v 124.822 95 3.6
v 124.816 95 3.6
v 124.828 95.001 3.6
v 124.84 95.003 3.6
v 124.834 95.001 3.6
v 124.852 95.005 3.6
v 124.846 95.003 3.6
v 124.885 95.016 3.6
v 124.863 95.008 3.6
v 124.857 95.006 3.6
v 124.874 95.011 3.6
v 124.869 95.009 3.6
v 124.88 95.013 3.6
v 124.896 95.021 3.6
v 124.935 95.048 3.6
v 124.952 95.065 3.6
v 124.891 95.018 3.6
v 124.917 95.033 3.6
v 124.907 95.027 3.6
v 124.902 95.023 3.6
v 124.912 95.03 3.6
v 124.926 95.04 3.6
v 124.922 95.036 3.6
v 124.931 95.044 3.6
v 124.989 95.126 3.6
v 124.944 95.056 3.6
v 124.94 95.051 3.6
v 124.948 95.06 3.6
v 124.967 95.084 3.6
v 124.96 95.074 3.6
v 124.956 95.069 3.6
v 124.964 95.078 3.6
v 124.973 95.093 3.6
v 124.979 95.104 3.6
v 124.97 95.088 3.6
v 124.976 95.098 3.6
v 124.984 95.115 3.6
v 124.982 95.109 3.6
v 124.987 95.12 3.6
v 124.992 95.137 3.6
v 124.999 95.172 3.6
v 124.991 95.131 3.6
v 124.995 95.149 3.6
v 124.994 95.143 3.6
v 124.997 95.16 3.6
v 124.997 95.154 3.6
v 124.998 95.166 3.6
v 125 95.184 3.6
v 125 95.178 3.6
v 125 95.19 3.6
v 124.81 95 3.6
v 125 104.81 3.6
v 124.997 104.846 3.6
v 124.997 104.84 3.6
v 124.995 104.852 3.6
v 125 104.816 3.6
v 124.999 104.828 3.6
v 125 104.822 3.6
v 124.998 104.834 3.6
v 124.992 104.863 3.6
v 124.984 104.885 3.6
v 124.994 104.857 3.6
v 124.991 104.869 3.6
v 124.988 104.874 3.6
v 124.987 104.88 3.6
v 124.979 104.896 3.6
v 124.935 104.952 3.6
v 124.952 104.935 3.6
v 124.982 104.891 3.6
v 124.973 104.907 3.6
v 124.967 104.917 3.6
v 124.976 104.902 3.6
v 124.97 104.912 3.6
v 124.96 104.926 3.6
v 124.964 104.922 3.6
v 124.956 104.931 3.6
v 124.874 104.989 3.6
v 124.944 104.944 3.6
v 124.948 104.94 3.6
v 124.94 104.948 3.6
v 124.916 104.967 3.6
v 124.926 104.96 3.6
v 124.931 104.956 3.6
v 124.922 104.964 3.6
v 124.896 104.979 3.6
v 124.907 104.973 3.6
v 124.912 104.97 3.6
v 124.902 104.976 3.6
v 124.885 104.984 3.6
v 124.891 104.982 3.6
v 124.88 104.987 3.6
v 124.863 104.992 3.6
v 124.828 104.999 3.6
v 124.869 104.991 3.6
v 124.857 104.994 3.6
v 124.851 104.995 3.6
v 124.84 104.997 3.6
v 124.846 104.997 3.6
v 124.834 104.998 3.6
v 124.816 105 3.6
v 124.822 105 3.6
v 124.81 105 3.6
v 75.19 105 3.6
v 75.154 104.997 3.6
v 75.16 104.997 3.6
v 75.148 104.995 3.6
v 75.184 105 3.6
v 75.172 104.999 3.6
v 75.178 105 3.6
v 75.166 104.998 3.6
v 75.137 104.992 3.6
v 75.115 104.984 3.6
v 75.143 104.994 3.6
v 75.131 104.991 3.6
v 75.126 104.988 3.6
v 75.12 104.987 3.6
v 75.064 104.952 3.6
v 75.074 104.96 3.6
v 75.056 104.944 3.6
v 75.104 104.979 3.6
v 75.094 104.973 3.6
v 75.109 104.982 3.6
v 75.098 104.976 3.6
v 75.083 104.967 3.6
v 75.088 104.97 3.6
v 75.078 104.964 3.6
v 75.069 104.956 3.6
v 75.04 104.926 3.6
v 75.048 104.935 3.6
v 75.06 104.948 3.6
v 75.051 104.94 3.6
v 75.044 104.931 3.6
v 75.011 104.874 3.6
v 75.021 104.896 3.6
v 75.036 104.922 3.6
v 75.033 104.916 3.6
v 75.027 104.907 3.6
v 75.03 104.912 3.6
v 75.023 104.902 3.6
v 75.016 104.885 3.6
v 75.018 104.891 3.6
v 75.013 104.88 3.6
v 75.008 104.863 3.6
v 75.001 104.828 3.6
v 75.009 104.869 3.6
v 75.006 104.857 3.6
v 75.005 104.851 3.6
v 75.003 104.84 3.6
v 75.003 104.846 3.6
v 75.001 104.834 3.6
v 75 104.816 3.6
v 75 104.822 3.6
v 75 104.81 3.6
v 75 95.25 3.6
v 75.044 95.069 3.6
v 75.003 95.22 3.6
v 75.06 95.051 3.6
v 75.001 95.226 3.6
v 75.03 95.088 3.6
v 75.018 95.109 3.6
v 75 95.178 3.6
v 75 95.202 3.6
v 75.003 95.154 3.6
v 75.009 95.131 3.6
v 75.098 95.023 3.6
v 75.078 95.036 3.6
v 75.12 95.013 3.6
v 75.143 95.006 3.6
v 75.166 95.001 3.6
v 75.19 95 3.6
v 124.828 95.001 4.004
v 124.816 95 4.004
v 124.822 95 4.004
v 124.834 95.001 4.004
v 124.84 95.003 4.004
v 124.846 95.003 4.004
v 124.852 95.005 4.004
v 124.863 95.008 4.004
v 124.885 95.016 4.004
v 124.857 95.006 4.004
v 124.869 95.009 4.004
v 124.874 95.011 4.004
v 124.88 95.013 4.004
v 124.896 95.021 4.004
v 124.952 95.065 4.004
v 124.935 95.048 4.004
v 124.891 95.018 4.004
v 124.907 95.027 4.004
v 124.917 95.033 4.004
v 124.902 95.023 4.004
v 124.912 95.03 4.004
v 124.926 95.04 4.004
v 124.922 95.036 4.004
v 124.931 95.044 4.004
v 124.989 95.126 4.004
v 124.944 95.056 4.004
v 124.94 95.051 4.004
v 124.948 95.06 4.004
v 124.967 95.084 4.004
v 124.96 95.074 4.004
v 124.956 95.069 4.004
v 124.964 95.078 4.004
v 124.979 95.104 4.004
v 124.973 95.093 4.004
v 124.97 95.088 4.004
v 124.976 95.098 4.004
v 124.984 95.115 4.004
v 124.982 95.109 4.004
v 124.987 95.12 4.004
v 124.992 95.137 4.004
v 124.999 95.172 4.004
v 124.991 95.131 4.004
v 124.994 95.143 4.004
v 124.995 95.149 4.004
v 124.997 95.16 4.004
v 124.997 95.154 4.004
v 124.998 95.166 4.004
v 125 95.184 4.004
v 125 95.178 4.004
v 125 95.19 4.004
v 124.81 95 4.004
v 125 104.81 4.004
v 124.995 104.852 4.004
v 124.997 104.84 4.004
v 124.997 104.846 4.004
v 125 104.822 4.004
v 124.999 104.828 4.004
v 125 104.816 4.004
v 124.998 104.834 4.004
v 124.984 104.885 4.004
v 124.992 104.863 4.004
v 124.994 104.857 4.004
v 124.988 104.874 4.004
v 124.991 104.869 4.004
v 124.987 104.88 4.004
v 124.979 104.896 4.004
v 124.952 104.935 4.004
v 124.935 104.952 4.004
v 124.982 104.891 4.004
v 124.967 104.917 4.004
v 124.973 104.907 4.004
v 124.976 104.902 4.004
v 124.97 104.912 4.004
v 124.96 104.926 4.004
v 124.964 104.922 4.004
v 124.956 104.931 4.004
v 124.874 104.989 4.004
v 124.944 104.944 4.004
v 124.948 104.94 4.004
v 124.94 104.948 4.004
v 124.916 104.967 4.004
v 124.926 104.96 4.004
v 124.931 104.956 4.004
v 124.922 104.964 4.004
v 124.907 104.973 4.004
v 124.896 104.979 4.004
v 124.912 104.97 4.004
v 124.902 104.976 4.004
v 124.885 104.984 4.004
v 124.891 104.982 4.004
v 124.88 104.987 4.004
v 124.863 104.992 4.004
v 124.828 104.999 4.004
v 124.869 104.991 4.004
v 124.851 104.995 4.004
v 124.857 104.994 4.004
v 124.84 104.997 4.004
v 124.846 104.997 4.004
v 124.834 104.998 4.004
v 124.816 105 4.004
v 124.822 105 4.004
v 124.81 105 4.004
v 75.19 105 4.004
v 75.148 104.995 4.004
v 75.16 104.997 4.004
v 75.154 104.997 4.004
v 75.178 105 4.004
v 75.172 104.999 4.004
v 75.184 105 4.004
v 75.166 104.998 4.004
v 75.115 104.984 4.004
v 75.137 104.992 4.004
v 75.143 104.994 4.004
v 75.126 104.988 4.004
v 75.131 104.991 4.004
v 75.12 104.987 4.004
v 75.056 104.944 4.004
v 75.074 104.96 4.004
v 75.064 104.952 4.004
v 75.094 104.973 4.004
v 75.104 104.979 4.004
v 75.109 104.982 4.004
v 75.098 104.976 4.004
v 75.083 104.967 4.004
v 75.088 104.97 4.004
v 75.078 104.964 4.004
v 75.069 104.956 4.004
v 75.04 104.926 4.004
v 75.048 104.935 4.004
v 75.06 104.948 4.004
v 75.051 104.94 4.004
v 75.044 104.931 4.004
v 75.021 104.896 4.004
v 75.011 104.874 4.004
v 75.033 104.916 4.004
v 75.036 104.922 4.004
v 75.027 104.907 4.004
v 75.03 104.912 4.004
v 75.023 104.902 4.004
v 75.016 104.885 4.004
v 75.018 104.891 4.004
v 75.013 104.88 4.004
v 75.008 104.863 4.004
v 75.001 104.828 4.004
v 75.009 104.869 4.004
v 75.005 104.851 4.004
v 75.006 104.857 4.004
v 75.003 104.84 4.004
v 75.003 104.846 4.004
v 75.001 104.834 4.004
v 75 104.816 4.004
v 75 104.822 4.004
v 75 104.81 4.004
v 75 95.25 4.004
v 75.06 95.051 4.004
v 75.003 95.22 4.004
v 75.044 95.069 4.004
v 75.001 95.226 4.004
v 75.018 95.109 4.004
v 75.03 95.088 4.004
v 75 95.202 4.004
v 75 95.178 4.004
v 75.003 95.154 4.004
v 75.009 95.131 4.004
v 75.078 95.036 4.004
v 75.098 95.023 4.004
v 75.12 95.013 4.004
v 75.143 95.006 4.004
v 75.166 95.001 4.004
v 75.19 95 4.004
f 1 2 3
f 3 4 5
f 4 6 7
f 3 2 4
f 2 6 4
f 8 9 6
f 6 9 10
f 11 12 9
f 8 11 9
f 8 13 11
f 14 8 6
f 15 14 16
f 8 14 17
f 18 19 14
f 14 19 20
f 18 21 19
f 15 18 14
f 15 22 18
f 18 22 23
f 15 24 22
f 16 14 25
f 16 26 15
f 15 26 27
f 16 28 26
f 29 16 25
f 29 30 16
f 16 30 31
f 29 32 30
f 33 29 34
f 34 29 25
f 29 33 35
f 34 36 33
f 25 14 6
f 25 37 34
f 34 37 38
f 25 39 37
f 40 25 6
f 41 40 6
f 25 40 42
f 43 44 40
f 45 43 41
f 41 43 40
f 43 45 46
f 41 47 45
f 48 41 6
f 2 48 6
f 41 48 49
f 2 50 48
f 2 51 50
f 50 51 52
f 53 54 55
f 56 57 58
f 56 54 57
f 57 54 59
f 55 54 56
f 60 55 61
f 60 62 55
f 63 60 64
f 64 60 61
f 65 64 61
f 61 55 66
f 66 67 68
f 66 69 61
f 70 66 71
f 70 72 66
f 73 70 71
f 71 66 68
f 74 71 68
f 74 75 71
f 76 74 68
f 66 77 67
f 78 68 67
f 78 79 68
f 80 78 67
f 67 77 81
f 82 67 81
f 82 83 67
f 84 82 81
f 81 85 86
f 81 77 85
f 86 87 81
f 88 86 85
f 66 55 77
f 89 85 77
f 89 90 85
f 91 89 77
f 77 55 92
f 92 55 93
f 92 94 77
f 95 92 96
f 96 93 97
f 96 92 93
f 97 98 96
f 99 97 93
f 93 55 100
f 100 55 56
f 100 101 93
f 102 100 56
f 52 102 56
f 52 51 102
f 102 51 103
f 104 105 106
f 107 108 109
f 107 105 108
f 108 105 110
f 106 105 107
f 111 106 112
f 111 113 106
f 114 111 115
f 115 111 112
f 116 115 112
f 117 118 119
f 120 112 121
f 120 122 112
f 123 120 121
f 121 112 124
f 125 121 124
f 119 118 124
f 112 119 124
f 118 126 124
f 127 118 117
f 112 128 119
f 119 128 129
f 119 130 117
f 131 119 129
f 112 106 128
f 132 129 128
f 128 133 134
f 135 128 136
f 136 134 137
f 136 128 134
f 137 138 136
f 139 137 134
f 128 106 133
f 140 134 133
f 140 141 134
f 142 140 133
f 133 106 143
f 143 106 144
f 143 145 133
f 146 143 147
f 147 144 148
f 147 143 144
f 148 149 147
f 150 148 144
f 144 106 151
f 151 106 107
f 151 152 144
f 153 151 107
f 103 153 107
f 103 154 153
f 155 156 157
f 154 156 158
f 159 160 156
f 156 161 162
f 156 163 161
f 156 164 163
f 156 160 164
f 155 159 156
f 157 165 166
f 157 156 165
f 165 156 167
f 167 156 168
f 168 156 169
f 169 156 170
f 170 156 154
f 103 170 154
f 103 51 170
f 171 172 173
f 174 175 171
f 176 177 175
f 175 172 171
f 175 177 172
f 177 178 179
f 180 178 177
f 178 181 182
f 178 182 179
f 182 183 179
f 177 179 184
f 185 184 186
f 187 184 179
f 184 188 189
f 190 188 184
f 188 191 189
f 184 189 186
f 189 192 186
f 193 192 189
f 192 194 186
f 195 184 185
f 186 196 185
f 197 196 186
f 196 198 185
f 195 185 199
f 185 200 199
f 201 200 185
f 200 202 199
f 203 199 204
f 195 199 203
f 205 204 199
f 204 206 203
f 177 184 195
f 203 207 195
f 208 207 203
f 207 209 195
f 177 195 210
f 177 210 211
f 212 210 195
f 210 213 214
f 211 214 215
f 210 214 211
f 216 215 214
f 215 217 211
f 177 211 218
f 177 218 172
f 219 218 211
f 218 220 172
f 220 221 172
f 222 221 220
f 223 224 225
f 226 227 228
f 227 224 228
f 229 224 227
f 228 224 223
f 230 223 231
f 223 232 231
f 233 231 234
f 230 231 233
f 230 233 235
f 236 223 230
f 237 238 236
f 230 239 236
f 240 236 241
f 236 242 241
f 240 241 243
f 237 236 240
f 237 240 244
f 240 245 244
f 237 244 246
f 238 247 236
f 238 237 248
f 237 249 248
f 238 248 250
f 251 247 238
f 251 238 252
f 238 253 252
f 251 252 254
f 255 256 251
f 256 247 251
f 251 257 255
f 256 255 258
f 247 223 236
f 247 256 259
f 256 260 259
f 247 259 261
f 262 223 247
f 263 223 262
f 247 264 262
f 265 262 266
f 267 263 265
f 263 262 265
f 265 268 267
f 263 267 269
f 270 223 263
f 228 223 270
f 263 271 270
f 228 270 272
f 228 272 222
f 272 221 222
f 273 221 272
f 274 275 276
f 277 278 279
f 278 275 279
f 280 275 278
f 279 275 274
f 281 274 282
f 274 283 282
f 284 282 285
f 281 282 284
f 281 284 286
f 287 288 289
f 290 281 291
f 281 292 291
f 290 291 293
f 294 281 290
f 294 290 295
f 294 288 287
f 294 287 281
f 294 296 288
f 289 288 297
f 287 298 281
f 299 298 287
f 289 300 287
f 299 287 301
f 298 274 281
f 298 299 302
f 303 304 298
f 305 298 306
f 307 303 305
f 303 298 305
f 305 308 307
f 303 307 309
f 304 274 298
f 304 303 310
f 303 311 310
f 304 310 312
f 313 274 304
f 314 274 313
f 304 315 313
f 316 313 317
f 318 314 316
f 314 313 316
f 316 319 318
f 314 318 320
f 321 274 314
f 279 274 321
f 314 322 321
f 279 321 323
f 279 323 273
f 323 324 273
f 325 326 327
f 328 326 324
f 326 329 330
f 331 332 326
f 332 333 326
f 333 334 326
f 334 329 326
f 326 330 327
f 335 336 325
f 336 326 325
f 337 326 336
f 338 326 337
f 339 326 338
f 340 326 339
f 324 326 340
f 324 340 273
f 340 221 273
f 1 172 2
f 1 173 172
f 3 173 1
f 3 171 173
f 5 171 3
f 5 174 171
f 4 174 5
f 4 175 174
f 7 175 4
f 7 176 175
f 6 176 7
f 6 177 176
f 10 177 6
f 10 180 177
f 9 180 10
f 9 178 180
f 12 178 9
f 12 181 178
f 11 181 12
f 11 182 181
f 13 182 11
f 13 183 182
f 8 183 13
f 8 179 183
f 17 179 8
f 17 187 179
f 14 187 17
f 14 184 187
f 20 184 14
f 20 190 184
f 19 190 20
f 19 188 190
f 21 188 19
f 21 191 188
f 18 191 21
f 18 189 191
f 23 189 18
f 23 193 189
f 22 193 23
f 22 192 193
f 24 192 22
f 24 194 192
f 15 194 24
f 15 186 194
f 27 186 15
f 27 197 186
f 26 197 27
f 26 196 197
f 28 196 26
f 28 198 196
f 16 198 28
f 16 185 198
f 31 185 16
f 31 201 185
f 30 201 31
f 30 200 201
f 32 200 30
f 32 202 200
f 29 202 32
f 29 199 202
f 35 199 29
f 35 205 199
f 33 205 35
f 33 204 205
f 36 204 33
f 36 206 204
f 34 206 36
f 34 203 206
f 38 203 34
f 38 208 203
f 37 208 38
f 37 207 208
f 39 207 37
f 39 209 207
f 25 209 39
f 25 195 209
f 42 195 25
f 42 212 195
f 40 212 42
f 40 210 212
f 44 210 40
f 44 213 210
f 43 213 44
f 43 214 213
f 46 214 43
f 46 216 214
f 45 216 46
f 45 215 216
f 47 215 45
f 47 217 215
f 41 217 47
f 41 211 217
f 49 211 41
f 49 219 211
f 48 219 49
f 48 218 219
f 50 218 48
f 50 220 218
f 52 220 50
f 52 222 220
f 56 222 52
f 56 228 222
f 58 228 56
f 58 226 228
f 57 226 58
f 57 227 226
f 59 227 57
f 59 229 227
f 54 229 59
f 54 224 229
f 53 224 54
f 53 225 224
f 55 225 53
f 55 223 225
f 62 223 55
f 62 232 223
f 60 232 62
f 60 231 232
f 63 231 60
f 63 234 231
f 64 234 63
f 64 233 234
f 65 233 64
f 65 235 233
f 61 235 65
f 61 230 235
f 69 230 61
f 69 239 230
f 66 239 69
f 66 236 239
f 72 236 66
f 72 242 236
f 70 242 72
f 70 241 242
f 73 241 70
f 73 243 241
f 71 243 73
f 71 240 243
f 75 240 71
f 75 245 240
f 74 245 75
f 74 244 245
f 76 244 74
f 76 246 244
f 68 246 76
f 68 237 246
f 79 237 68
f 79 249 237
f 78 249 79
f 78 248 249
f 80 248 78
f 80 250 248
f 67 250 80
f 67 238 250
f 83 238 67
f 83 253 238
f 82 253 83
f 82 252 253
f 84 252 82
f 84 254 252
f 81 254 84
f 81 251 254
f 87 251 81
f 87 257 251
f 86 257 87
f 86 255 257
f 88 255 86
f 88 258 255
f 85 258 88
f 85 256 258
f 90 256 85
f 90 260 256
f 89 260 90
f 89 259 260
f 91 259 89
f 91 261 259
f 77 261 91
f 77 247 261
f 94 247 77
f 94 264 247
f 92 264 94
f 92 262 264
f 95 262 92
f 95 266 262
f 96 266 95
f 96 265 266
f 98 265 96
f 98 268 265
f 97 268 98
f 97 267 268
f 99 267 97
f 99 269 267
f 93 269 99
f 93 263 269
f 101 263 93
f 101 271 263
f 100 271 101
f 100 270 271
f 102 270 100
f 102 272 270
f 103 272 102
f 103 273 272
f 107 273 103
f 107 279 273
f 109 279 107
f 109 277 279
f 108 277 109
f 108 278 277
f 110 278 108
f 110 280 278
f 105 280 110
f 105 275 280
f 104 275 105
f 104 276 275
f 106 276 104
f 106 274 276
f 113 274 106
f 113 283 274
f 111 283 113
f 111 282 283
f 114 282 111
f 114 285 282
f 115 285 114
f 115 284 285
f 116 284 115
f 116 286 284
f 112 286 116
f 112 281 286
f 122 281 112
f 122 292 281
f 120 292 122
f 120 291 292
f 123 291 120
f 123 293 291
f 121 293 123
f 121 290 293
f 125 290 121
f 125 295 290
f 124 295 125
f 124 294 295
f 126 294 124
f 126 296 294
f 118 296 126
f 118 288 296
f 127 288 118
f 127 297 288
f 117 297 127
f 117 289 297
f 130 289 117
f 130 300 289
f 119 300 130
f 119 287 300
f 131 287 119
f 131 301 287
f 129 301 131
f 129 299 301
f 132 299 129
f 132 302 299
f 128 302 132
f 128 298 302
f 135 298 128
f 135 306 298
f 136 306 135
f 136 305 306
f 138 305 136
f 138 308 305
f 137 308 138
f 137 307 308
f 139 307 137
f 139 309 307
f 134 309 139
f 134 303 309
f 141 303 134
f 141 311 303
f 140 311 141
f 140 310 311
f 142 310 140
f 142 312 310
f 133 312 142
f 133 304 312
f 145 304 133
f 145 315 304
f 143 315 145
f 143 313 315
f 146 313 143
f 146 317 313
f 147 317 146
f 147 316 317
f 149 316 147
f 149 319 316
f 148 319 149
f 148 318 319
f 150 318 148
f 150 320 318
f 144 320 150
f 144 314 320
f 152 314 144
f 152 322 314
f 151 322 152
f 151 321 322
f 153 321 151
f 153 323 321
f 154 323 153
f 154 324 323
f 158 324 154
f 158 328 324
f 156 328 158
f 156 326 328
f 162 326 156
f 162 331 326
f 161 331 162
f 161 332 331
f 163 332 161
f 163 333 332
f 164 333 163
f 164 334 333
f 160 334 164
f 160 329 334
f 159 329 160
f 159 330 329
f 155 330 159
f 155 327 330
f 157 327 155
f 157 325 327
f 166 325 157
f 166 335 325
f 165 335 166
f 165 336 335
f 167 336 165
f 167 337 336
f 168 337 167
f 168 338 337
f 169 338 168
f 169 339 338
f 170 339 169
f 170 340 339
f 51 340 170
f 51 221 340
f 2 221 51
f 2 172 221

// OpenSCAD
module drawBasicShape(x1, y1, x2, y2, width)
{
	length = sqrt((x1-x2)*(x1-x2) + (y1-y2)*(y1-y2));
	if (width!=0.0) {
		square(size = [width, length], center = false);
		translate([width/2.0, 0, 0]) circle(d=width);
		translate([width/2.0, length, 0]) circle(d=width);
	}
}

module translateAndRotate(x1, y1, x2, y2, width)
{
	if (width != 0.0) {
		angle = atan((y2-y1)/(x2-x1)) +270;
		if (x2>=x1) {
			translate([x1, y1, 0.0]) rotate([0.0, 0.0, angle]) translate([-width/2.0, 0.0, 0.0]) scale([1.0, 1.0, 1.0]) drawBasicShape(x1, y1, x2, y2, width);
		}
		else {
			translate([x1, y1, 0.0]) rotate([0.0, 0.0, angle+180]) translate([-width/2.0, 0.0, 0.0]) scale([1.0, 1.0, 1.0]) drawBasicShape(x1, y1, x2, y2, width);		}
	}
}

$fn=50;

points8 = [
[75.77800000, 95.77800000, 0.00000000],
[124.22200000, 95.77800000, 0.37999548],
[124.22200000, 104.22200000, 0.37997788],
[75.77800000, 104.22200000, 0.37999672],
[75.77800000, 95.83800000, 0.37997423],
[75.48400000, 95.48400000, 0.00000000],
[124.51600000, 95.48400000, 0.37999868],
[124.51600000, 104.51600000, 0.37998977],
[75.48400000, 104.51600000, 0.37999746],
[75.48400000, 95.54400000, 0.37998644],
[75.19000000, 95.19000000, 0.00000000],
[124.81000000, 95.19000000, 0.38000060],
[124.81000000, 104.81000000, 0.38000021],
[75.19000000, 104.81000000, 0.37999939],
[75.19000000, 95.25000000, 0.38000344],
[75.53600000, 95.39000000, 0.00000000],
[75.94600000, 103.88900000, 0.00000000],
[76.11100000, 104.05400000, 0.37961375],
[76.52800000, 104.05400000, 0.38001190],
[75.94600000, 103.47200000, 0.37989934],
[75.94600000, 103.05500000, 0.38001190],
[76.94500000, 104.05400000, 0.37998907],
[77.36200000, 104.05400000, 0.38001190],
[75.94600000, 102.63800000, 0.37999592],
[75.94600000, 102.22100000, 0.38001190],
[77.77900000, 104.05400000, 0.37999966],
[78.19600000, 104.05400000, 0.38001190],
[75.94600000, 101.80400000, 0.38002091],
[75.94600000, 101.38700000, 0.38001190],
[78.61300000, 104.05400000, 0.38001957],
[79.03000000, 104.05400000, 0.38001190],
[75.94600000, 100.97000000, 0.38001859],
[75.94600000, 100.55300000, 0.38001190],
[79.44700000, 104.05400000, 0.38001785],
[79.86400000, 104.05400000, 0.38015610],
[75.94600000, 100.13600000, 0.38001726],
[75.94600000, 99.71900000, 0.38015610],
[80.28100000, 104.05400000, 0.38002660],
[80.69800000, 104.05400000, 0.38001190],
[75.94600000, 99.30200000, 0.38002534],
[75.94600000, 98.88500000, 0.38015610],
[81.11500000, 104.05400000, 0.38002430],
[81.53300000, 104.05400000, 0.37945200],
[75.94600000, 98.46700000, 0.37997836],
[75.94600000, 98.05000000, 0.38001190],
[81.95000000, 104.05400000, 0.37998072],
[82.36700000, 104.05400000, 0.38001190],
[75.94600000, 97.63300000, 0.37998939],
[75.94600000, 97.21600000, 0.38001190],
[82.78400000, 104.05400000, 0.37999079],
[83.20100000, 104.05400000, 0.38015610],
[75.94600000, 96.79900000, 0.37999203],
[75.94600000, 96.38200000, 0.38001190],
[83.61800000, 104.05400000, 0.37999868],
[84.03500000, 104.05400000, 0.38001190],
[75.95600000, 95.97600000, 0.38000275],
[76.34400000, 95.94600000, 0.37958004],
[84.45200000, 104.05400000, 0.38000229],
[84.86900000, 104.05400000, 0.38015610],
[76.76100000, 95.94600000, 0.38000229],
[77.17800000, 95.94600000, 0.38001190],
[85.28600000, 104.05400000, 0.38000229],
[85.70300000, 104.05400000, 0.38015610],
[77.59500000, 95.94600000, 0.38000229],
[78.01200000, 95.94600000, 0.38001190],
[86.12000000, 104.05400000, 0.38000754],
[86.53700000, 104.05400000, 0.38001190],
[78.42900000, 95.94600000, 0.38000229],
[78.84600000, 95.94600000, 0.38001190],
[86.95400000, 104.05400000, 0.38000754],
[87.37100000, 104.05400000, 0.38001190],
[79.26300000, 95.94600000, 0.38000229],
[79.68000000, 95.94600000, 0.38015610],
[87.78900000, 104.05400000, 0.37998415],
[88.20600000, 104.05400000, 0.38001190],
[80.09700000, 95.94600000, 0.37998940],
[80.51500000, 95.94600000, 0.37930814],
[88.62300000, 104.05400000, 0.38000229],
[89.04000000, 104.05400000, 0.38001190],
[80.93200000, 95.94600000, 0.38000754],
[81.34900000, 95.94600000, 0.38001190],
[89.45700000, 104.05400000, 0.38000229],
[89.87400000, 104.05400000, 0.38015610],
[81.76600000, 95.94600000, 0.38000229],
[82.18300000, 95.94600000, 0.38001190],
[90.29100000, 104.05400000, 0.38000754],
[90.70800000, 104.05400000, 0.38001190],
[82.60000000, 95.94600000, 0.38000229],
[83.01700000, 95.94600000, 0.38001190],
[91.12500000, 104.05400000, 0.38000754],
[91.54200000, 104.05400000, 0.38001190],
[83.43400000, 95.94600000, 0.38000229],
[83.85100000, 95.94600000, 0.38015610],
[91.95900000, 104.05400000, 0.38000229],
[92.37600000, 104.05400000, 0.38001190],
[84.26800000, 95.94600000, 0.38000754],
[84.68500000, 95.94600000, 0.38001190],
[92.79300000, 104.05400000, 0.38000229],
[93.21000000, 104.05400000, 0.38001190],
[85.10200000, 95.94600000, 0.38000754],
[85.51900000, 95.94600000, 0.38001190],
[93.62700000, 104.05400000, 0.38000229],
[94.04400000, 104.05400000, 0.38015610],
[85.93600000, 95.94600000, 0.38000229],
[86.35300000, 95.94600000, 0.38001190],
[94.46200000, 104.05400000, 0.37998940],
[94.87900000, 104.05400000, 0.38001190],
[86.77000000, 95.94600000, 0.37998415],
[87.18800000, 95.94600000, 0.37930814],
[95.29600000, 104.05400000, 0.38000754],
[95.71300000, 104.05400000, 0.38001190],
[87.60500000, 95.94600000, 0.38000229],
[88.02200000, 95.94600000, 0.38015610],
[96.13000000, 104.05400000, 0.38000229],
[96.54700000, 104.05400000, 0.38001190],
[88.43900000, 95.94600000, 0.38000754],
[88.85600000, 95.94600000, 0.38001190],
[96.96400000, 104.05400000, 0.38000229],
[97.38100000, 104.05400000, 0.38001190],
[89.27300000, 95.94600000, 0.38000754],
[89.69000000, 95.94600000, 0.38001190],
[97.79800000, 104.05400000, 0.38000229],
[98.21500000, 104.05400000, 0.38015610],
[90.10700000, 95.94600000, 0.38000229],
[90.52400000, 95.94600000, 0.38001190],
[98.63200000, 104.05400000, 0.38000754],
[99.04900000, 104.05400000, 0.38001190],
[90.94100000, 95.94600000, 0.38000229],
[91.35800000, 95.94600000, 0.38001190],
[99.46600000, 104.05400000, 0.38000754],
[99.88300000, 104.05400000, 0.38001190],
[91.77500000, 95.94600000, 0.38000229],
[92.19200000, 95.94600000, 0.38015610],
[100.30000000, 104.05400000, 0.38000229],
[100.71800000, 104.05400000, 0.37930814],
[92.60900000, 95.94600000, 0.37998940],
[93.02600000, 95.94600000, 0.38001190],
[101.13500000, 104.05400000, 0.37998415],
[101.55200000, 104.05400000, 0.38001190],
[93.44400000, 95.94600000, 0.38000754],
[93.86100000, 95.94600000, 0.38001190],
[101.96900000, 104.05400000, 0.38000229],
[102.38600000, 104.05400000, 0.38015610],
[94.27800000, 95.94600000, 0.38000229],
[94.69500000, 95.94600000, 0.38001190],
[102.80300000, 104.05400000, 0.38000229],
[103.22000000, 104.05400000, 0.38015610],
[95.11200000, 95.94600000, 0.38000229],
[95.52900000, 95.94600000, 0.38001190],
[103.63700000, 104.05400000, 0.38000754],
[104.05400000, 104.05400000, 0.38001190],
[95.94600000, 95.94600000, 0.38000229],
[96.36300000, 95.94600000, 0.38001190],
[104.47100000, 104.05400000, 0.38000754],
[104.88800000, 104.05400000, 0.38001190],
[96.78000000, 95.94600000, 0.38000229],
[97.19700000, 95.94600000, 0.38015610],
[105.30500000, 104.05400000, 0.38000229],
[105.72200000, 104.05400000, 0.38001190],
[97.61400000, 95.94600000, 0.38000754],
[98.03100000, 95.94600000, 0.38001190],
[106.13900000, 104.05400000, 0.38000229],
[106.55600000, 104.05400000, 0.38001190],
[98.44800000, 95.94600000, 0.38000754],
[98.86500000, 95.94600000, 0.38001190],
[106.97300000, 104.05400000, 0.38000229],
[107.39100000, 104.05400000, 0.37945200],
[99.28200000, 95.94600000, 0.37998415],
[99.69900000, 95.94600000, 0.38001190],
[107.80800000, 104.05400000, 0.37998940],
[108.22500000, 104.05400000, 0.38001190],
[100.11700000, 95.94600000, 0.38000229],
[100.53400000, 95.94600000, 0.38001190],
[108.64200000, 104.05400000, 0.38000754],
[109.05900000, 104.05400000, 0.38001190],
[100.95100000, 95.94600000, 0.38000229],
[101.36800000, 95.94600000, 0.38015610],
[109.47600000, 104.05400000, 0.38000229],
[109.89300000, 104.05400000, 0.38001190],
[101.78500000, 95.94600000, 0.38000754],
[102.20200000, 95.94600000, 0.38001190],
[110.31000000, 104.05400000, 0.38000229],
[110.72700000, 104.05400000, 0.38001190],
[102.61900000, 95.94600000, 0.38000754],
[103.03600000, 95.94600000, 0.38001190],
[111.14400000, 104.05400000, 0.38000229],
[111.56100000, 104.05400000, 0.38015610],
[103.45300000, 95.94600000, 0.38000229],
[103.87000000, 95.94600000, 0.38001190],
[111.97800000, 104.05400000, 0.38000754],
[112.39500000, 104.05400000, 0.38001190],
[104.28700000, 95.94600000, 0.38000229],
[104.70400000, 95.94600000, 0.38001190],
[112.81200000, 104.05400000, 0.38000754],
[113.22900000, 104.05400000, 0.38001190],
[105.12100000, 95.94600000, 0.38000229],
[105.53800000, 95.94600000, 0.38015610],
[113.64700000, 104.05400000, 0.37998415],
[114.06400000, 104.05400000, 0.38001190],
[105.95500000, 95.94600000, 0.37998415],
[106.37300000, 95.94600000, 0.37945200],
[114.48100000, 104.05400000, 0.38000229],
[114.89800000, 104.05400000, 0.38001190],
[106.79000000, 95.94600000, 0.38000754],
[107.20700000, 95.94600000, 0.38001190],
[115.31500000, 104.05400000, 0.38000229],
[115.73200000, 104.05400000, 0.38015610],
[107.62400000, 95.94600000, 0.38000229],
[108.04100000, 95.94600000, 0.38001190],
[116.14900000, 104.05400000, 0.38000229],
[116.56600000, 104.05400000, 0.38015610],
[108.45800000, 95.94600000, 0.38000229],
[108.87500000, 95.94600000, 0.38001190],
[116.98300000, 104.05400000, 0.38000754],
[117.40000000, 104.05400000, 0.38001190],
[109.29200000, 95.94600000, 0.38000229],
[109.70900000, 95.94600000, 0.38001190],
[117.81700000, 104.05400000, 0.38000754],
[118.23400000, 104.05400000, 0.38001190],
[110.12600000, 95.94600000, 0.38000229],
[110.54300000, 95.94600000, 0.38015610],
[118.65100000, 104.05400000, 0.38000229],
[119.06800000, 104.05400000, 0.38001190],
[110.96000000, 95.94600000, 0.38000754],
[111.37700000, 95.94600000, 0.38001190],
[119.48500000, 104.05400000, 0.38000229],
[119.90200000, 104.05400000, 0.38001190],
[111.79400000, 95.94600000, 0.38000754],
[112.21100000, 95.94600000, 0.38001190],
[120.32000000, 104.05400000, 0.37998415],
[120.73700000, 104.05400000, 0.38015610],
[112.62900000, 95.94600000, 0.38000229],
[113.04600000, 95.94600000, 0.38001190],
[121.15400000, 104.05400000, 0.38000754],
[121.57100000, 104.05400000, 0.38001190],
[113.46300000, 95.94600000, 0.38000229],
[113.88000000, 95.94600000, 0.38001190],
[121.98800000, 104.05400000, 0.38000754],
[122.40500000, 104.05400000, 0.38001190],
[114.29700000, 95.94600000, 0.38000229],
[114.71400000, 95.94600000, 0.38015610],
[122.82200000, 104.05400000, 0.38000229],
[123.23900000, 104.05400000, 0.38001190],
[115.13100000, 95.94600000, 0.38000229],
[115.54800000, 95.94600000, 0.38015610],
[123.65600000, 104.05400000, 0.38000229],
[124.04400000, 104.02500000, 0.37963728],
[115.96500000, 95.94600000, 0.37998455],
[116.38200000, 95.94600000, 0.38015610],
[124.05400000, 103.61800000, 0.37999868],
[124.05400000, 103.20100000, 0.38001190],
[116.79900000, 95.94600000, 0.37999203],
[117.21600000, 95.94600000, 0.38015610],
[124.05400000, 102.78400000, 0.37999079],
[124.05400000, 102.36700000, 0.38001190],
[117.63300000, 95.94600000, 0.37998939],
[118.05000000, 95.94600000, 0.38015610],
[124.05400000, 101.95000000, 0.37998072],
[124.05400000, 101.53300000, 0.38001190],
[118.46700000, 95.94600000, 0.37998597],
[118.88400000, 95.94600000, 0.38001190],
[124.05400000, 101.11600000, 0.37997562],
[124.05400000, 100.69800000, 0.37930814],
[119.30200000, 95.94600000, 0.38003429],
[119.71900000, 95.94600000, 0.38001190],
[124.05400000, 100.28100000, 0.38003640],
[124.05400000, 99.86400000, 0.38001190],
[120.13600000, 95.94600000, 0.38002811],
[120.55300000, 95.94600000, 0.38001190],
[124.05400000, 99.44700000, 0.38002999],
[124.05400000, 99.03000000, 0.38001190],
[120.97000000, 95.94600000, 0.38003238],
[121.38700000, 95.94600000, 0.38001190],
[124.05400000, 98.61300000, 0.38001957],
[124.05400000, 98.19600000, 0.38001190],
[121.80400000, 95.94600000, 0.38002091],
[122.22100000, 95.94600000, 0.38001190],
[124.05400000, 97.77900000, 0.38002285],
[124.05400000, 97.36200000, 0.38001190],
[122.63800000, 95.94600000, 0.37999592],
[123.05500000, 95.94600000, 0.38001190],
[124.05400000, 96.94500000, 0.37998907],
[124.05400000, 96.52800000, 0.38001190],
[123.47200000, 95.94600000, 0.37997240],
[123.88900000, 95.94600000, 0.38001190],
[124.05400000, 96.11100000, 0.37961375],
];

translate([0.0, 0.0, 3.60000000]) {
	linear_extrude(height = 0.40400000, center = false, convexity = 10, twist = 0) {
		union() {
			for( i=[0:len(points8)-2] ){ 
				x1 = points8[i][0];
				y1 = points8[i][1];
				x2 = points8[i+1][0];
				y2 = points8[i+1][1];
				width = points8[i+1][2];
				translateAndRotate(x1, y1, x2, y2, width);
			}
		}
	}
}
